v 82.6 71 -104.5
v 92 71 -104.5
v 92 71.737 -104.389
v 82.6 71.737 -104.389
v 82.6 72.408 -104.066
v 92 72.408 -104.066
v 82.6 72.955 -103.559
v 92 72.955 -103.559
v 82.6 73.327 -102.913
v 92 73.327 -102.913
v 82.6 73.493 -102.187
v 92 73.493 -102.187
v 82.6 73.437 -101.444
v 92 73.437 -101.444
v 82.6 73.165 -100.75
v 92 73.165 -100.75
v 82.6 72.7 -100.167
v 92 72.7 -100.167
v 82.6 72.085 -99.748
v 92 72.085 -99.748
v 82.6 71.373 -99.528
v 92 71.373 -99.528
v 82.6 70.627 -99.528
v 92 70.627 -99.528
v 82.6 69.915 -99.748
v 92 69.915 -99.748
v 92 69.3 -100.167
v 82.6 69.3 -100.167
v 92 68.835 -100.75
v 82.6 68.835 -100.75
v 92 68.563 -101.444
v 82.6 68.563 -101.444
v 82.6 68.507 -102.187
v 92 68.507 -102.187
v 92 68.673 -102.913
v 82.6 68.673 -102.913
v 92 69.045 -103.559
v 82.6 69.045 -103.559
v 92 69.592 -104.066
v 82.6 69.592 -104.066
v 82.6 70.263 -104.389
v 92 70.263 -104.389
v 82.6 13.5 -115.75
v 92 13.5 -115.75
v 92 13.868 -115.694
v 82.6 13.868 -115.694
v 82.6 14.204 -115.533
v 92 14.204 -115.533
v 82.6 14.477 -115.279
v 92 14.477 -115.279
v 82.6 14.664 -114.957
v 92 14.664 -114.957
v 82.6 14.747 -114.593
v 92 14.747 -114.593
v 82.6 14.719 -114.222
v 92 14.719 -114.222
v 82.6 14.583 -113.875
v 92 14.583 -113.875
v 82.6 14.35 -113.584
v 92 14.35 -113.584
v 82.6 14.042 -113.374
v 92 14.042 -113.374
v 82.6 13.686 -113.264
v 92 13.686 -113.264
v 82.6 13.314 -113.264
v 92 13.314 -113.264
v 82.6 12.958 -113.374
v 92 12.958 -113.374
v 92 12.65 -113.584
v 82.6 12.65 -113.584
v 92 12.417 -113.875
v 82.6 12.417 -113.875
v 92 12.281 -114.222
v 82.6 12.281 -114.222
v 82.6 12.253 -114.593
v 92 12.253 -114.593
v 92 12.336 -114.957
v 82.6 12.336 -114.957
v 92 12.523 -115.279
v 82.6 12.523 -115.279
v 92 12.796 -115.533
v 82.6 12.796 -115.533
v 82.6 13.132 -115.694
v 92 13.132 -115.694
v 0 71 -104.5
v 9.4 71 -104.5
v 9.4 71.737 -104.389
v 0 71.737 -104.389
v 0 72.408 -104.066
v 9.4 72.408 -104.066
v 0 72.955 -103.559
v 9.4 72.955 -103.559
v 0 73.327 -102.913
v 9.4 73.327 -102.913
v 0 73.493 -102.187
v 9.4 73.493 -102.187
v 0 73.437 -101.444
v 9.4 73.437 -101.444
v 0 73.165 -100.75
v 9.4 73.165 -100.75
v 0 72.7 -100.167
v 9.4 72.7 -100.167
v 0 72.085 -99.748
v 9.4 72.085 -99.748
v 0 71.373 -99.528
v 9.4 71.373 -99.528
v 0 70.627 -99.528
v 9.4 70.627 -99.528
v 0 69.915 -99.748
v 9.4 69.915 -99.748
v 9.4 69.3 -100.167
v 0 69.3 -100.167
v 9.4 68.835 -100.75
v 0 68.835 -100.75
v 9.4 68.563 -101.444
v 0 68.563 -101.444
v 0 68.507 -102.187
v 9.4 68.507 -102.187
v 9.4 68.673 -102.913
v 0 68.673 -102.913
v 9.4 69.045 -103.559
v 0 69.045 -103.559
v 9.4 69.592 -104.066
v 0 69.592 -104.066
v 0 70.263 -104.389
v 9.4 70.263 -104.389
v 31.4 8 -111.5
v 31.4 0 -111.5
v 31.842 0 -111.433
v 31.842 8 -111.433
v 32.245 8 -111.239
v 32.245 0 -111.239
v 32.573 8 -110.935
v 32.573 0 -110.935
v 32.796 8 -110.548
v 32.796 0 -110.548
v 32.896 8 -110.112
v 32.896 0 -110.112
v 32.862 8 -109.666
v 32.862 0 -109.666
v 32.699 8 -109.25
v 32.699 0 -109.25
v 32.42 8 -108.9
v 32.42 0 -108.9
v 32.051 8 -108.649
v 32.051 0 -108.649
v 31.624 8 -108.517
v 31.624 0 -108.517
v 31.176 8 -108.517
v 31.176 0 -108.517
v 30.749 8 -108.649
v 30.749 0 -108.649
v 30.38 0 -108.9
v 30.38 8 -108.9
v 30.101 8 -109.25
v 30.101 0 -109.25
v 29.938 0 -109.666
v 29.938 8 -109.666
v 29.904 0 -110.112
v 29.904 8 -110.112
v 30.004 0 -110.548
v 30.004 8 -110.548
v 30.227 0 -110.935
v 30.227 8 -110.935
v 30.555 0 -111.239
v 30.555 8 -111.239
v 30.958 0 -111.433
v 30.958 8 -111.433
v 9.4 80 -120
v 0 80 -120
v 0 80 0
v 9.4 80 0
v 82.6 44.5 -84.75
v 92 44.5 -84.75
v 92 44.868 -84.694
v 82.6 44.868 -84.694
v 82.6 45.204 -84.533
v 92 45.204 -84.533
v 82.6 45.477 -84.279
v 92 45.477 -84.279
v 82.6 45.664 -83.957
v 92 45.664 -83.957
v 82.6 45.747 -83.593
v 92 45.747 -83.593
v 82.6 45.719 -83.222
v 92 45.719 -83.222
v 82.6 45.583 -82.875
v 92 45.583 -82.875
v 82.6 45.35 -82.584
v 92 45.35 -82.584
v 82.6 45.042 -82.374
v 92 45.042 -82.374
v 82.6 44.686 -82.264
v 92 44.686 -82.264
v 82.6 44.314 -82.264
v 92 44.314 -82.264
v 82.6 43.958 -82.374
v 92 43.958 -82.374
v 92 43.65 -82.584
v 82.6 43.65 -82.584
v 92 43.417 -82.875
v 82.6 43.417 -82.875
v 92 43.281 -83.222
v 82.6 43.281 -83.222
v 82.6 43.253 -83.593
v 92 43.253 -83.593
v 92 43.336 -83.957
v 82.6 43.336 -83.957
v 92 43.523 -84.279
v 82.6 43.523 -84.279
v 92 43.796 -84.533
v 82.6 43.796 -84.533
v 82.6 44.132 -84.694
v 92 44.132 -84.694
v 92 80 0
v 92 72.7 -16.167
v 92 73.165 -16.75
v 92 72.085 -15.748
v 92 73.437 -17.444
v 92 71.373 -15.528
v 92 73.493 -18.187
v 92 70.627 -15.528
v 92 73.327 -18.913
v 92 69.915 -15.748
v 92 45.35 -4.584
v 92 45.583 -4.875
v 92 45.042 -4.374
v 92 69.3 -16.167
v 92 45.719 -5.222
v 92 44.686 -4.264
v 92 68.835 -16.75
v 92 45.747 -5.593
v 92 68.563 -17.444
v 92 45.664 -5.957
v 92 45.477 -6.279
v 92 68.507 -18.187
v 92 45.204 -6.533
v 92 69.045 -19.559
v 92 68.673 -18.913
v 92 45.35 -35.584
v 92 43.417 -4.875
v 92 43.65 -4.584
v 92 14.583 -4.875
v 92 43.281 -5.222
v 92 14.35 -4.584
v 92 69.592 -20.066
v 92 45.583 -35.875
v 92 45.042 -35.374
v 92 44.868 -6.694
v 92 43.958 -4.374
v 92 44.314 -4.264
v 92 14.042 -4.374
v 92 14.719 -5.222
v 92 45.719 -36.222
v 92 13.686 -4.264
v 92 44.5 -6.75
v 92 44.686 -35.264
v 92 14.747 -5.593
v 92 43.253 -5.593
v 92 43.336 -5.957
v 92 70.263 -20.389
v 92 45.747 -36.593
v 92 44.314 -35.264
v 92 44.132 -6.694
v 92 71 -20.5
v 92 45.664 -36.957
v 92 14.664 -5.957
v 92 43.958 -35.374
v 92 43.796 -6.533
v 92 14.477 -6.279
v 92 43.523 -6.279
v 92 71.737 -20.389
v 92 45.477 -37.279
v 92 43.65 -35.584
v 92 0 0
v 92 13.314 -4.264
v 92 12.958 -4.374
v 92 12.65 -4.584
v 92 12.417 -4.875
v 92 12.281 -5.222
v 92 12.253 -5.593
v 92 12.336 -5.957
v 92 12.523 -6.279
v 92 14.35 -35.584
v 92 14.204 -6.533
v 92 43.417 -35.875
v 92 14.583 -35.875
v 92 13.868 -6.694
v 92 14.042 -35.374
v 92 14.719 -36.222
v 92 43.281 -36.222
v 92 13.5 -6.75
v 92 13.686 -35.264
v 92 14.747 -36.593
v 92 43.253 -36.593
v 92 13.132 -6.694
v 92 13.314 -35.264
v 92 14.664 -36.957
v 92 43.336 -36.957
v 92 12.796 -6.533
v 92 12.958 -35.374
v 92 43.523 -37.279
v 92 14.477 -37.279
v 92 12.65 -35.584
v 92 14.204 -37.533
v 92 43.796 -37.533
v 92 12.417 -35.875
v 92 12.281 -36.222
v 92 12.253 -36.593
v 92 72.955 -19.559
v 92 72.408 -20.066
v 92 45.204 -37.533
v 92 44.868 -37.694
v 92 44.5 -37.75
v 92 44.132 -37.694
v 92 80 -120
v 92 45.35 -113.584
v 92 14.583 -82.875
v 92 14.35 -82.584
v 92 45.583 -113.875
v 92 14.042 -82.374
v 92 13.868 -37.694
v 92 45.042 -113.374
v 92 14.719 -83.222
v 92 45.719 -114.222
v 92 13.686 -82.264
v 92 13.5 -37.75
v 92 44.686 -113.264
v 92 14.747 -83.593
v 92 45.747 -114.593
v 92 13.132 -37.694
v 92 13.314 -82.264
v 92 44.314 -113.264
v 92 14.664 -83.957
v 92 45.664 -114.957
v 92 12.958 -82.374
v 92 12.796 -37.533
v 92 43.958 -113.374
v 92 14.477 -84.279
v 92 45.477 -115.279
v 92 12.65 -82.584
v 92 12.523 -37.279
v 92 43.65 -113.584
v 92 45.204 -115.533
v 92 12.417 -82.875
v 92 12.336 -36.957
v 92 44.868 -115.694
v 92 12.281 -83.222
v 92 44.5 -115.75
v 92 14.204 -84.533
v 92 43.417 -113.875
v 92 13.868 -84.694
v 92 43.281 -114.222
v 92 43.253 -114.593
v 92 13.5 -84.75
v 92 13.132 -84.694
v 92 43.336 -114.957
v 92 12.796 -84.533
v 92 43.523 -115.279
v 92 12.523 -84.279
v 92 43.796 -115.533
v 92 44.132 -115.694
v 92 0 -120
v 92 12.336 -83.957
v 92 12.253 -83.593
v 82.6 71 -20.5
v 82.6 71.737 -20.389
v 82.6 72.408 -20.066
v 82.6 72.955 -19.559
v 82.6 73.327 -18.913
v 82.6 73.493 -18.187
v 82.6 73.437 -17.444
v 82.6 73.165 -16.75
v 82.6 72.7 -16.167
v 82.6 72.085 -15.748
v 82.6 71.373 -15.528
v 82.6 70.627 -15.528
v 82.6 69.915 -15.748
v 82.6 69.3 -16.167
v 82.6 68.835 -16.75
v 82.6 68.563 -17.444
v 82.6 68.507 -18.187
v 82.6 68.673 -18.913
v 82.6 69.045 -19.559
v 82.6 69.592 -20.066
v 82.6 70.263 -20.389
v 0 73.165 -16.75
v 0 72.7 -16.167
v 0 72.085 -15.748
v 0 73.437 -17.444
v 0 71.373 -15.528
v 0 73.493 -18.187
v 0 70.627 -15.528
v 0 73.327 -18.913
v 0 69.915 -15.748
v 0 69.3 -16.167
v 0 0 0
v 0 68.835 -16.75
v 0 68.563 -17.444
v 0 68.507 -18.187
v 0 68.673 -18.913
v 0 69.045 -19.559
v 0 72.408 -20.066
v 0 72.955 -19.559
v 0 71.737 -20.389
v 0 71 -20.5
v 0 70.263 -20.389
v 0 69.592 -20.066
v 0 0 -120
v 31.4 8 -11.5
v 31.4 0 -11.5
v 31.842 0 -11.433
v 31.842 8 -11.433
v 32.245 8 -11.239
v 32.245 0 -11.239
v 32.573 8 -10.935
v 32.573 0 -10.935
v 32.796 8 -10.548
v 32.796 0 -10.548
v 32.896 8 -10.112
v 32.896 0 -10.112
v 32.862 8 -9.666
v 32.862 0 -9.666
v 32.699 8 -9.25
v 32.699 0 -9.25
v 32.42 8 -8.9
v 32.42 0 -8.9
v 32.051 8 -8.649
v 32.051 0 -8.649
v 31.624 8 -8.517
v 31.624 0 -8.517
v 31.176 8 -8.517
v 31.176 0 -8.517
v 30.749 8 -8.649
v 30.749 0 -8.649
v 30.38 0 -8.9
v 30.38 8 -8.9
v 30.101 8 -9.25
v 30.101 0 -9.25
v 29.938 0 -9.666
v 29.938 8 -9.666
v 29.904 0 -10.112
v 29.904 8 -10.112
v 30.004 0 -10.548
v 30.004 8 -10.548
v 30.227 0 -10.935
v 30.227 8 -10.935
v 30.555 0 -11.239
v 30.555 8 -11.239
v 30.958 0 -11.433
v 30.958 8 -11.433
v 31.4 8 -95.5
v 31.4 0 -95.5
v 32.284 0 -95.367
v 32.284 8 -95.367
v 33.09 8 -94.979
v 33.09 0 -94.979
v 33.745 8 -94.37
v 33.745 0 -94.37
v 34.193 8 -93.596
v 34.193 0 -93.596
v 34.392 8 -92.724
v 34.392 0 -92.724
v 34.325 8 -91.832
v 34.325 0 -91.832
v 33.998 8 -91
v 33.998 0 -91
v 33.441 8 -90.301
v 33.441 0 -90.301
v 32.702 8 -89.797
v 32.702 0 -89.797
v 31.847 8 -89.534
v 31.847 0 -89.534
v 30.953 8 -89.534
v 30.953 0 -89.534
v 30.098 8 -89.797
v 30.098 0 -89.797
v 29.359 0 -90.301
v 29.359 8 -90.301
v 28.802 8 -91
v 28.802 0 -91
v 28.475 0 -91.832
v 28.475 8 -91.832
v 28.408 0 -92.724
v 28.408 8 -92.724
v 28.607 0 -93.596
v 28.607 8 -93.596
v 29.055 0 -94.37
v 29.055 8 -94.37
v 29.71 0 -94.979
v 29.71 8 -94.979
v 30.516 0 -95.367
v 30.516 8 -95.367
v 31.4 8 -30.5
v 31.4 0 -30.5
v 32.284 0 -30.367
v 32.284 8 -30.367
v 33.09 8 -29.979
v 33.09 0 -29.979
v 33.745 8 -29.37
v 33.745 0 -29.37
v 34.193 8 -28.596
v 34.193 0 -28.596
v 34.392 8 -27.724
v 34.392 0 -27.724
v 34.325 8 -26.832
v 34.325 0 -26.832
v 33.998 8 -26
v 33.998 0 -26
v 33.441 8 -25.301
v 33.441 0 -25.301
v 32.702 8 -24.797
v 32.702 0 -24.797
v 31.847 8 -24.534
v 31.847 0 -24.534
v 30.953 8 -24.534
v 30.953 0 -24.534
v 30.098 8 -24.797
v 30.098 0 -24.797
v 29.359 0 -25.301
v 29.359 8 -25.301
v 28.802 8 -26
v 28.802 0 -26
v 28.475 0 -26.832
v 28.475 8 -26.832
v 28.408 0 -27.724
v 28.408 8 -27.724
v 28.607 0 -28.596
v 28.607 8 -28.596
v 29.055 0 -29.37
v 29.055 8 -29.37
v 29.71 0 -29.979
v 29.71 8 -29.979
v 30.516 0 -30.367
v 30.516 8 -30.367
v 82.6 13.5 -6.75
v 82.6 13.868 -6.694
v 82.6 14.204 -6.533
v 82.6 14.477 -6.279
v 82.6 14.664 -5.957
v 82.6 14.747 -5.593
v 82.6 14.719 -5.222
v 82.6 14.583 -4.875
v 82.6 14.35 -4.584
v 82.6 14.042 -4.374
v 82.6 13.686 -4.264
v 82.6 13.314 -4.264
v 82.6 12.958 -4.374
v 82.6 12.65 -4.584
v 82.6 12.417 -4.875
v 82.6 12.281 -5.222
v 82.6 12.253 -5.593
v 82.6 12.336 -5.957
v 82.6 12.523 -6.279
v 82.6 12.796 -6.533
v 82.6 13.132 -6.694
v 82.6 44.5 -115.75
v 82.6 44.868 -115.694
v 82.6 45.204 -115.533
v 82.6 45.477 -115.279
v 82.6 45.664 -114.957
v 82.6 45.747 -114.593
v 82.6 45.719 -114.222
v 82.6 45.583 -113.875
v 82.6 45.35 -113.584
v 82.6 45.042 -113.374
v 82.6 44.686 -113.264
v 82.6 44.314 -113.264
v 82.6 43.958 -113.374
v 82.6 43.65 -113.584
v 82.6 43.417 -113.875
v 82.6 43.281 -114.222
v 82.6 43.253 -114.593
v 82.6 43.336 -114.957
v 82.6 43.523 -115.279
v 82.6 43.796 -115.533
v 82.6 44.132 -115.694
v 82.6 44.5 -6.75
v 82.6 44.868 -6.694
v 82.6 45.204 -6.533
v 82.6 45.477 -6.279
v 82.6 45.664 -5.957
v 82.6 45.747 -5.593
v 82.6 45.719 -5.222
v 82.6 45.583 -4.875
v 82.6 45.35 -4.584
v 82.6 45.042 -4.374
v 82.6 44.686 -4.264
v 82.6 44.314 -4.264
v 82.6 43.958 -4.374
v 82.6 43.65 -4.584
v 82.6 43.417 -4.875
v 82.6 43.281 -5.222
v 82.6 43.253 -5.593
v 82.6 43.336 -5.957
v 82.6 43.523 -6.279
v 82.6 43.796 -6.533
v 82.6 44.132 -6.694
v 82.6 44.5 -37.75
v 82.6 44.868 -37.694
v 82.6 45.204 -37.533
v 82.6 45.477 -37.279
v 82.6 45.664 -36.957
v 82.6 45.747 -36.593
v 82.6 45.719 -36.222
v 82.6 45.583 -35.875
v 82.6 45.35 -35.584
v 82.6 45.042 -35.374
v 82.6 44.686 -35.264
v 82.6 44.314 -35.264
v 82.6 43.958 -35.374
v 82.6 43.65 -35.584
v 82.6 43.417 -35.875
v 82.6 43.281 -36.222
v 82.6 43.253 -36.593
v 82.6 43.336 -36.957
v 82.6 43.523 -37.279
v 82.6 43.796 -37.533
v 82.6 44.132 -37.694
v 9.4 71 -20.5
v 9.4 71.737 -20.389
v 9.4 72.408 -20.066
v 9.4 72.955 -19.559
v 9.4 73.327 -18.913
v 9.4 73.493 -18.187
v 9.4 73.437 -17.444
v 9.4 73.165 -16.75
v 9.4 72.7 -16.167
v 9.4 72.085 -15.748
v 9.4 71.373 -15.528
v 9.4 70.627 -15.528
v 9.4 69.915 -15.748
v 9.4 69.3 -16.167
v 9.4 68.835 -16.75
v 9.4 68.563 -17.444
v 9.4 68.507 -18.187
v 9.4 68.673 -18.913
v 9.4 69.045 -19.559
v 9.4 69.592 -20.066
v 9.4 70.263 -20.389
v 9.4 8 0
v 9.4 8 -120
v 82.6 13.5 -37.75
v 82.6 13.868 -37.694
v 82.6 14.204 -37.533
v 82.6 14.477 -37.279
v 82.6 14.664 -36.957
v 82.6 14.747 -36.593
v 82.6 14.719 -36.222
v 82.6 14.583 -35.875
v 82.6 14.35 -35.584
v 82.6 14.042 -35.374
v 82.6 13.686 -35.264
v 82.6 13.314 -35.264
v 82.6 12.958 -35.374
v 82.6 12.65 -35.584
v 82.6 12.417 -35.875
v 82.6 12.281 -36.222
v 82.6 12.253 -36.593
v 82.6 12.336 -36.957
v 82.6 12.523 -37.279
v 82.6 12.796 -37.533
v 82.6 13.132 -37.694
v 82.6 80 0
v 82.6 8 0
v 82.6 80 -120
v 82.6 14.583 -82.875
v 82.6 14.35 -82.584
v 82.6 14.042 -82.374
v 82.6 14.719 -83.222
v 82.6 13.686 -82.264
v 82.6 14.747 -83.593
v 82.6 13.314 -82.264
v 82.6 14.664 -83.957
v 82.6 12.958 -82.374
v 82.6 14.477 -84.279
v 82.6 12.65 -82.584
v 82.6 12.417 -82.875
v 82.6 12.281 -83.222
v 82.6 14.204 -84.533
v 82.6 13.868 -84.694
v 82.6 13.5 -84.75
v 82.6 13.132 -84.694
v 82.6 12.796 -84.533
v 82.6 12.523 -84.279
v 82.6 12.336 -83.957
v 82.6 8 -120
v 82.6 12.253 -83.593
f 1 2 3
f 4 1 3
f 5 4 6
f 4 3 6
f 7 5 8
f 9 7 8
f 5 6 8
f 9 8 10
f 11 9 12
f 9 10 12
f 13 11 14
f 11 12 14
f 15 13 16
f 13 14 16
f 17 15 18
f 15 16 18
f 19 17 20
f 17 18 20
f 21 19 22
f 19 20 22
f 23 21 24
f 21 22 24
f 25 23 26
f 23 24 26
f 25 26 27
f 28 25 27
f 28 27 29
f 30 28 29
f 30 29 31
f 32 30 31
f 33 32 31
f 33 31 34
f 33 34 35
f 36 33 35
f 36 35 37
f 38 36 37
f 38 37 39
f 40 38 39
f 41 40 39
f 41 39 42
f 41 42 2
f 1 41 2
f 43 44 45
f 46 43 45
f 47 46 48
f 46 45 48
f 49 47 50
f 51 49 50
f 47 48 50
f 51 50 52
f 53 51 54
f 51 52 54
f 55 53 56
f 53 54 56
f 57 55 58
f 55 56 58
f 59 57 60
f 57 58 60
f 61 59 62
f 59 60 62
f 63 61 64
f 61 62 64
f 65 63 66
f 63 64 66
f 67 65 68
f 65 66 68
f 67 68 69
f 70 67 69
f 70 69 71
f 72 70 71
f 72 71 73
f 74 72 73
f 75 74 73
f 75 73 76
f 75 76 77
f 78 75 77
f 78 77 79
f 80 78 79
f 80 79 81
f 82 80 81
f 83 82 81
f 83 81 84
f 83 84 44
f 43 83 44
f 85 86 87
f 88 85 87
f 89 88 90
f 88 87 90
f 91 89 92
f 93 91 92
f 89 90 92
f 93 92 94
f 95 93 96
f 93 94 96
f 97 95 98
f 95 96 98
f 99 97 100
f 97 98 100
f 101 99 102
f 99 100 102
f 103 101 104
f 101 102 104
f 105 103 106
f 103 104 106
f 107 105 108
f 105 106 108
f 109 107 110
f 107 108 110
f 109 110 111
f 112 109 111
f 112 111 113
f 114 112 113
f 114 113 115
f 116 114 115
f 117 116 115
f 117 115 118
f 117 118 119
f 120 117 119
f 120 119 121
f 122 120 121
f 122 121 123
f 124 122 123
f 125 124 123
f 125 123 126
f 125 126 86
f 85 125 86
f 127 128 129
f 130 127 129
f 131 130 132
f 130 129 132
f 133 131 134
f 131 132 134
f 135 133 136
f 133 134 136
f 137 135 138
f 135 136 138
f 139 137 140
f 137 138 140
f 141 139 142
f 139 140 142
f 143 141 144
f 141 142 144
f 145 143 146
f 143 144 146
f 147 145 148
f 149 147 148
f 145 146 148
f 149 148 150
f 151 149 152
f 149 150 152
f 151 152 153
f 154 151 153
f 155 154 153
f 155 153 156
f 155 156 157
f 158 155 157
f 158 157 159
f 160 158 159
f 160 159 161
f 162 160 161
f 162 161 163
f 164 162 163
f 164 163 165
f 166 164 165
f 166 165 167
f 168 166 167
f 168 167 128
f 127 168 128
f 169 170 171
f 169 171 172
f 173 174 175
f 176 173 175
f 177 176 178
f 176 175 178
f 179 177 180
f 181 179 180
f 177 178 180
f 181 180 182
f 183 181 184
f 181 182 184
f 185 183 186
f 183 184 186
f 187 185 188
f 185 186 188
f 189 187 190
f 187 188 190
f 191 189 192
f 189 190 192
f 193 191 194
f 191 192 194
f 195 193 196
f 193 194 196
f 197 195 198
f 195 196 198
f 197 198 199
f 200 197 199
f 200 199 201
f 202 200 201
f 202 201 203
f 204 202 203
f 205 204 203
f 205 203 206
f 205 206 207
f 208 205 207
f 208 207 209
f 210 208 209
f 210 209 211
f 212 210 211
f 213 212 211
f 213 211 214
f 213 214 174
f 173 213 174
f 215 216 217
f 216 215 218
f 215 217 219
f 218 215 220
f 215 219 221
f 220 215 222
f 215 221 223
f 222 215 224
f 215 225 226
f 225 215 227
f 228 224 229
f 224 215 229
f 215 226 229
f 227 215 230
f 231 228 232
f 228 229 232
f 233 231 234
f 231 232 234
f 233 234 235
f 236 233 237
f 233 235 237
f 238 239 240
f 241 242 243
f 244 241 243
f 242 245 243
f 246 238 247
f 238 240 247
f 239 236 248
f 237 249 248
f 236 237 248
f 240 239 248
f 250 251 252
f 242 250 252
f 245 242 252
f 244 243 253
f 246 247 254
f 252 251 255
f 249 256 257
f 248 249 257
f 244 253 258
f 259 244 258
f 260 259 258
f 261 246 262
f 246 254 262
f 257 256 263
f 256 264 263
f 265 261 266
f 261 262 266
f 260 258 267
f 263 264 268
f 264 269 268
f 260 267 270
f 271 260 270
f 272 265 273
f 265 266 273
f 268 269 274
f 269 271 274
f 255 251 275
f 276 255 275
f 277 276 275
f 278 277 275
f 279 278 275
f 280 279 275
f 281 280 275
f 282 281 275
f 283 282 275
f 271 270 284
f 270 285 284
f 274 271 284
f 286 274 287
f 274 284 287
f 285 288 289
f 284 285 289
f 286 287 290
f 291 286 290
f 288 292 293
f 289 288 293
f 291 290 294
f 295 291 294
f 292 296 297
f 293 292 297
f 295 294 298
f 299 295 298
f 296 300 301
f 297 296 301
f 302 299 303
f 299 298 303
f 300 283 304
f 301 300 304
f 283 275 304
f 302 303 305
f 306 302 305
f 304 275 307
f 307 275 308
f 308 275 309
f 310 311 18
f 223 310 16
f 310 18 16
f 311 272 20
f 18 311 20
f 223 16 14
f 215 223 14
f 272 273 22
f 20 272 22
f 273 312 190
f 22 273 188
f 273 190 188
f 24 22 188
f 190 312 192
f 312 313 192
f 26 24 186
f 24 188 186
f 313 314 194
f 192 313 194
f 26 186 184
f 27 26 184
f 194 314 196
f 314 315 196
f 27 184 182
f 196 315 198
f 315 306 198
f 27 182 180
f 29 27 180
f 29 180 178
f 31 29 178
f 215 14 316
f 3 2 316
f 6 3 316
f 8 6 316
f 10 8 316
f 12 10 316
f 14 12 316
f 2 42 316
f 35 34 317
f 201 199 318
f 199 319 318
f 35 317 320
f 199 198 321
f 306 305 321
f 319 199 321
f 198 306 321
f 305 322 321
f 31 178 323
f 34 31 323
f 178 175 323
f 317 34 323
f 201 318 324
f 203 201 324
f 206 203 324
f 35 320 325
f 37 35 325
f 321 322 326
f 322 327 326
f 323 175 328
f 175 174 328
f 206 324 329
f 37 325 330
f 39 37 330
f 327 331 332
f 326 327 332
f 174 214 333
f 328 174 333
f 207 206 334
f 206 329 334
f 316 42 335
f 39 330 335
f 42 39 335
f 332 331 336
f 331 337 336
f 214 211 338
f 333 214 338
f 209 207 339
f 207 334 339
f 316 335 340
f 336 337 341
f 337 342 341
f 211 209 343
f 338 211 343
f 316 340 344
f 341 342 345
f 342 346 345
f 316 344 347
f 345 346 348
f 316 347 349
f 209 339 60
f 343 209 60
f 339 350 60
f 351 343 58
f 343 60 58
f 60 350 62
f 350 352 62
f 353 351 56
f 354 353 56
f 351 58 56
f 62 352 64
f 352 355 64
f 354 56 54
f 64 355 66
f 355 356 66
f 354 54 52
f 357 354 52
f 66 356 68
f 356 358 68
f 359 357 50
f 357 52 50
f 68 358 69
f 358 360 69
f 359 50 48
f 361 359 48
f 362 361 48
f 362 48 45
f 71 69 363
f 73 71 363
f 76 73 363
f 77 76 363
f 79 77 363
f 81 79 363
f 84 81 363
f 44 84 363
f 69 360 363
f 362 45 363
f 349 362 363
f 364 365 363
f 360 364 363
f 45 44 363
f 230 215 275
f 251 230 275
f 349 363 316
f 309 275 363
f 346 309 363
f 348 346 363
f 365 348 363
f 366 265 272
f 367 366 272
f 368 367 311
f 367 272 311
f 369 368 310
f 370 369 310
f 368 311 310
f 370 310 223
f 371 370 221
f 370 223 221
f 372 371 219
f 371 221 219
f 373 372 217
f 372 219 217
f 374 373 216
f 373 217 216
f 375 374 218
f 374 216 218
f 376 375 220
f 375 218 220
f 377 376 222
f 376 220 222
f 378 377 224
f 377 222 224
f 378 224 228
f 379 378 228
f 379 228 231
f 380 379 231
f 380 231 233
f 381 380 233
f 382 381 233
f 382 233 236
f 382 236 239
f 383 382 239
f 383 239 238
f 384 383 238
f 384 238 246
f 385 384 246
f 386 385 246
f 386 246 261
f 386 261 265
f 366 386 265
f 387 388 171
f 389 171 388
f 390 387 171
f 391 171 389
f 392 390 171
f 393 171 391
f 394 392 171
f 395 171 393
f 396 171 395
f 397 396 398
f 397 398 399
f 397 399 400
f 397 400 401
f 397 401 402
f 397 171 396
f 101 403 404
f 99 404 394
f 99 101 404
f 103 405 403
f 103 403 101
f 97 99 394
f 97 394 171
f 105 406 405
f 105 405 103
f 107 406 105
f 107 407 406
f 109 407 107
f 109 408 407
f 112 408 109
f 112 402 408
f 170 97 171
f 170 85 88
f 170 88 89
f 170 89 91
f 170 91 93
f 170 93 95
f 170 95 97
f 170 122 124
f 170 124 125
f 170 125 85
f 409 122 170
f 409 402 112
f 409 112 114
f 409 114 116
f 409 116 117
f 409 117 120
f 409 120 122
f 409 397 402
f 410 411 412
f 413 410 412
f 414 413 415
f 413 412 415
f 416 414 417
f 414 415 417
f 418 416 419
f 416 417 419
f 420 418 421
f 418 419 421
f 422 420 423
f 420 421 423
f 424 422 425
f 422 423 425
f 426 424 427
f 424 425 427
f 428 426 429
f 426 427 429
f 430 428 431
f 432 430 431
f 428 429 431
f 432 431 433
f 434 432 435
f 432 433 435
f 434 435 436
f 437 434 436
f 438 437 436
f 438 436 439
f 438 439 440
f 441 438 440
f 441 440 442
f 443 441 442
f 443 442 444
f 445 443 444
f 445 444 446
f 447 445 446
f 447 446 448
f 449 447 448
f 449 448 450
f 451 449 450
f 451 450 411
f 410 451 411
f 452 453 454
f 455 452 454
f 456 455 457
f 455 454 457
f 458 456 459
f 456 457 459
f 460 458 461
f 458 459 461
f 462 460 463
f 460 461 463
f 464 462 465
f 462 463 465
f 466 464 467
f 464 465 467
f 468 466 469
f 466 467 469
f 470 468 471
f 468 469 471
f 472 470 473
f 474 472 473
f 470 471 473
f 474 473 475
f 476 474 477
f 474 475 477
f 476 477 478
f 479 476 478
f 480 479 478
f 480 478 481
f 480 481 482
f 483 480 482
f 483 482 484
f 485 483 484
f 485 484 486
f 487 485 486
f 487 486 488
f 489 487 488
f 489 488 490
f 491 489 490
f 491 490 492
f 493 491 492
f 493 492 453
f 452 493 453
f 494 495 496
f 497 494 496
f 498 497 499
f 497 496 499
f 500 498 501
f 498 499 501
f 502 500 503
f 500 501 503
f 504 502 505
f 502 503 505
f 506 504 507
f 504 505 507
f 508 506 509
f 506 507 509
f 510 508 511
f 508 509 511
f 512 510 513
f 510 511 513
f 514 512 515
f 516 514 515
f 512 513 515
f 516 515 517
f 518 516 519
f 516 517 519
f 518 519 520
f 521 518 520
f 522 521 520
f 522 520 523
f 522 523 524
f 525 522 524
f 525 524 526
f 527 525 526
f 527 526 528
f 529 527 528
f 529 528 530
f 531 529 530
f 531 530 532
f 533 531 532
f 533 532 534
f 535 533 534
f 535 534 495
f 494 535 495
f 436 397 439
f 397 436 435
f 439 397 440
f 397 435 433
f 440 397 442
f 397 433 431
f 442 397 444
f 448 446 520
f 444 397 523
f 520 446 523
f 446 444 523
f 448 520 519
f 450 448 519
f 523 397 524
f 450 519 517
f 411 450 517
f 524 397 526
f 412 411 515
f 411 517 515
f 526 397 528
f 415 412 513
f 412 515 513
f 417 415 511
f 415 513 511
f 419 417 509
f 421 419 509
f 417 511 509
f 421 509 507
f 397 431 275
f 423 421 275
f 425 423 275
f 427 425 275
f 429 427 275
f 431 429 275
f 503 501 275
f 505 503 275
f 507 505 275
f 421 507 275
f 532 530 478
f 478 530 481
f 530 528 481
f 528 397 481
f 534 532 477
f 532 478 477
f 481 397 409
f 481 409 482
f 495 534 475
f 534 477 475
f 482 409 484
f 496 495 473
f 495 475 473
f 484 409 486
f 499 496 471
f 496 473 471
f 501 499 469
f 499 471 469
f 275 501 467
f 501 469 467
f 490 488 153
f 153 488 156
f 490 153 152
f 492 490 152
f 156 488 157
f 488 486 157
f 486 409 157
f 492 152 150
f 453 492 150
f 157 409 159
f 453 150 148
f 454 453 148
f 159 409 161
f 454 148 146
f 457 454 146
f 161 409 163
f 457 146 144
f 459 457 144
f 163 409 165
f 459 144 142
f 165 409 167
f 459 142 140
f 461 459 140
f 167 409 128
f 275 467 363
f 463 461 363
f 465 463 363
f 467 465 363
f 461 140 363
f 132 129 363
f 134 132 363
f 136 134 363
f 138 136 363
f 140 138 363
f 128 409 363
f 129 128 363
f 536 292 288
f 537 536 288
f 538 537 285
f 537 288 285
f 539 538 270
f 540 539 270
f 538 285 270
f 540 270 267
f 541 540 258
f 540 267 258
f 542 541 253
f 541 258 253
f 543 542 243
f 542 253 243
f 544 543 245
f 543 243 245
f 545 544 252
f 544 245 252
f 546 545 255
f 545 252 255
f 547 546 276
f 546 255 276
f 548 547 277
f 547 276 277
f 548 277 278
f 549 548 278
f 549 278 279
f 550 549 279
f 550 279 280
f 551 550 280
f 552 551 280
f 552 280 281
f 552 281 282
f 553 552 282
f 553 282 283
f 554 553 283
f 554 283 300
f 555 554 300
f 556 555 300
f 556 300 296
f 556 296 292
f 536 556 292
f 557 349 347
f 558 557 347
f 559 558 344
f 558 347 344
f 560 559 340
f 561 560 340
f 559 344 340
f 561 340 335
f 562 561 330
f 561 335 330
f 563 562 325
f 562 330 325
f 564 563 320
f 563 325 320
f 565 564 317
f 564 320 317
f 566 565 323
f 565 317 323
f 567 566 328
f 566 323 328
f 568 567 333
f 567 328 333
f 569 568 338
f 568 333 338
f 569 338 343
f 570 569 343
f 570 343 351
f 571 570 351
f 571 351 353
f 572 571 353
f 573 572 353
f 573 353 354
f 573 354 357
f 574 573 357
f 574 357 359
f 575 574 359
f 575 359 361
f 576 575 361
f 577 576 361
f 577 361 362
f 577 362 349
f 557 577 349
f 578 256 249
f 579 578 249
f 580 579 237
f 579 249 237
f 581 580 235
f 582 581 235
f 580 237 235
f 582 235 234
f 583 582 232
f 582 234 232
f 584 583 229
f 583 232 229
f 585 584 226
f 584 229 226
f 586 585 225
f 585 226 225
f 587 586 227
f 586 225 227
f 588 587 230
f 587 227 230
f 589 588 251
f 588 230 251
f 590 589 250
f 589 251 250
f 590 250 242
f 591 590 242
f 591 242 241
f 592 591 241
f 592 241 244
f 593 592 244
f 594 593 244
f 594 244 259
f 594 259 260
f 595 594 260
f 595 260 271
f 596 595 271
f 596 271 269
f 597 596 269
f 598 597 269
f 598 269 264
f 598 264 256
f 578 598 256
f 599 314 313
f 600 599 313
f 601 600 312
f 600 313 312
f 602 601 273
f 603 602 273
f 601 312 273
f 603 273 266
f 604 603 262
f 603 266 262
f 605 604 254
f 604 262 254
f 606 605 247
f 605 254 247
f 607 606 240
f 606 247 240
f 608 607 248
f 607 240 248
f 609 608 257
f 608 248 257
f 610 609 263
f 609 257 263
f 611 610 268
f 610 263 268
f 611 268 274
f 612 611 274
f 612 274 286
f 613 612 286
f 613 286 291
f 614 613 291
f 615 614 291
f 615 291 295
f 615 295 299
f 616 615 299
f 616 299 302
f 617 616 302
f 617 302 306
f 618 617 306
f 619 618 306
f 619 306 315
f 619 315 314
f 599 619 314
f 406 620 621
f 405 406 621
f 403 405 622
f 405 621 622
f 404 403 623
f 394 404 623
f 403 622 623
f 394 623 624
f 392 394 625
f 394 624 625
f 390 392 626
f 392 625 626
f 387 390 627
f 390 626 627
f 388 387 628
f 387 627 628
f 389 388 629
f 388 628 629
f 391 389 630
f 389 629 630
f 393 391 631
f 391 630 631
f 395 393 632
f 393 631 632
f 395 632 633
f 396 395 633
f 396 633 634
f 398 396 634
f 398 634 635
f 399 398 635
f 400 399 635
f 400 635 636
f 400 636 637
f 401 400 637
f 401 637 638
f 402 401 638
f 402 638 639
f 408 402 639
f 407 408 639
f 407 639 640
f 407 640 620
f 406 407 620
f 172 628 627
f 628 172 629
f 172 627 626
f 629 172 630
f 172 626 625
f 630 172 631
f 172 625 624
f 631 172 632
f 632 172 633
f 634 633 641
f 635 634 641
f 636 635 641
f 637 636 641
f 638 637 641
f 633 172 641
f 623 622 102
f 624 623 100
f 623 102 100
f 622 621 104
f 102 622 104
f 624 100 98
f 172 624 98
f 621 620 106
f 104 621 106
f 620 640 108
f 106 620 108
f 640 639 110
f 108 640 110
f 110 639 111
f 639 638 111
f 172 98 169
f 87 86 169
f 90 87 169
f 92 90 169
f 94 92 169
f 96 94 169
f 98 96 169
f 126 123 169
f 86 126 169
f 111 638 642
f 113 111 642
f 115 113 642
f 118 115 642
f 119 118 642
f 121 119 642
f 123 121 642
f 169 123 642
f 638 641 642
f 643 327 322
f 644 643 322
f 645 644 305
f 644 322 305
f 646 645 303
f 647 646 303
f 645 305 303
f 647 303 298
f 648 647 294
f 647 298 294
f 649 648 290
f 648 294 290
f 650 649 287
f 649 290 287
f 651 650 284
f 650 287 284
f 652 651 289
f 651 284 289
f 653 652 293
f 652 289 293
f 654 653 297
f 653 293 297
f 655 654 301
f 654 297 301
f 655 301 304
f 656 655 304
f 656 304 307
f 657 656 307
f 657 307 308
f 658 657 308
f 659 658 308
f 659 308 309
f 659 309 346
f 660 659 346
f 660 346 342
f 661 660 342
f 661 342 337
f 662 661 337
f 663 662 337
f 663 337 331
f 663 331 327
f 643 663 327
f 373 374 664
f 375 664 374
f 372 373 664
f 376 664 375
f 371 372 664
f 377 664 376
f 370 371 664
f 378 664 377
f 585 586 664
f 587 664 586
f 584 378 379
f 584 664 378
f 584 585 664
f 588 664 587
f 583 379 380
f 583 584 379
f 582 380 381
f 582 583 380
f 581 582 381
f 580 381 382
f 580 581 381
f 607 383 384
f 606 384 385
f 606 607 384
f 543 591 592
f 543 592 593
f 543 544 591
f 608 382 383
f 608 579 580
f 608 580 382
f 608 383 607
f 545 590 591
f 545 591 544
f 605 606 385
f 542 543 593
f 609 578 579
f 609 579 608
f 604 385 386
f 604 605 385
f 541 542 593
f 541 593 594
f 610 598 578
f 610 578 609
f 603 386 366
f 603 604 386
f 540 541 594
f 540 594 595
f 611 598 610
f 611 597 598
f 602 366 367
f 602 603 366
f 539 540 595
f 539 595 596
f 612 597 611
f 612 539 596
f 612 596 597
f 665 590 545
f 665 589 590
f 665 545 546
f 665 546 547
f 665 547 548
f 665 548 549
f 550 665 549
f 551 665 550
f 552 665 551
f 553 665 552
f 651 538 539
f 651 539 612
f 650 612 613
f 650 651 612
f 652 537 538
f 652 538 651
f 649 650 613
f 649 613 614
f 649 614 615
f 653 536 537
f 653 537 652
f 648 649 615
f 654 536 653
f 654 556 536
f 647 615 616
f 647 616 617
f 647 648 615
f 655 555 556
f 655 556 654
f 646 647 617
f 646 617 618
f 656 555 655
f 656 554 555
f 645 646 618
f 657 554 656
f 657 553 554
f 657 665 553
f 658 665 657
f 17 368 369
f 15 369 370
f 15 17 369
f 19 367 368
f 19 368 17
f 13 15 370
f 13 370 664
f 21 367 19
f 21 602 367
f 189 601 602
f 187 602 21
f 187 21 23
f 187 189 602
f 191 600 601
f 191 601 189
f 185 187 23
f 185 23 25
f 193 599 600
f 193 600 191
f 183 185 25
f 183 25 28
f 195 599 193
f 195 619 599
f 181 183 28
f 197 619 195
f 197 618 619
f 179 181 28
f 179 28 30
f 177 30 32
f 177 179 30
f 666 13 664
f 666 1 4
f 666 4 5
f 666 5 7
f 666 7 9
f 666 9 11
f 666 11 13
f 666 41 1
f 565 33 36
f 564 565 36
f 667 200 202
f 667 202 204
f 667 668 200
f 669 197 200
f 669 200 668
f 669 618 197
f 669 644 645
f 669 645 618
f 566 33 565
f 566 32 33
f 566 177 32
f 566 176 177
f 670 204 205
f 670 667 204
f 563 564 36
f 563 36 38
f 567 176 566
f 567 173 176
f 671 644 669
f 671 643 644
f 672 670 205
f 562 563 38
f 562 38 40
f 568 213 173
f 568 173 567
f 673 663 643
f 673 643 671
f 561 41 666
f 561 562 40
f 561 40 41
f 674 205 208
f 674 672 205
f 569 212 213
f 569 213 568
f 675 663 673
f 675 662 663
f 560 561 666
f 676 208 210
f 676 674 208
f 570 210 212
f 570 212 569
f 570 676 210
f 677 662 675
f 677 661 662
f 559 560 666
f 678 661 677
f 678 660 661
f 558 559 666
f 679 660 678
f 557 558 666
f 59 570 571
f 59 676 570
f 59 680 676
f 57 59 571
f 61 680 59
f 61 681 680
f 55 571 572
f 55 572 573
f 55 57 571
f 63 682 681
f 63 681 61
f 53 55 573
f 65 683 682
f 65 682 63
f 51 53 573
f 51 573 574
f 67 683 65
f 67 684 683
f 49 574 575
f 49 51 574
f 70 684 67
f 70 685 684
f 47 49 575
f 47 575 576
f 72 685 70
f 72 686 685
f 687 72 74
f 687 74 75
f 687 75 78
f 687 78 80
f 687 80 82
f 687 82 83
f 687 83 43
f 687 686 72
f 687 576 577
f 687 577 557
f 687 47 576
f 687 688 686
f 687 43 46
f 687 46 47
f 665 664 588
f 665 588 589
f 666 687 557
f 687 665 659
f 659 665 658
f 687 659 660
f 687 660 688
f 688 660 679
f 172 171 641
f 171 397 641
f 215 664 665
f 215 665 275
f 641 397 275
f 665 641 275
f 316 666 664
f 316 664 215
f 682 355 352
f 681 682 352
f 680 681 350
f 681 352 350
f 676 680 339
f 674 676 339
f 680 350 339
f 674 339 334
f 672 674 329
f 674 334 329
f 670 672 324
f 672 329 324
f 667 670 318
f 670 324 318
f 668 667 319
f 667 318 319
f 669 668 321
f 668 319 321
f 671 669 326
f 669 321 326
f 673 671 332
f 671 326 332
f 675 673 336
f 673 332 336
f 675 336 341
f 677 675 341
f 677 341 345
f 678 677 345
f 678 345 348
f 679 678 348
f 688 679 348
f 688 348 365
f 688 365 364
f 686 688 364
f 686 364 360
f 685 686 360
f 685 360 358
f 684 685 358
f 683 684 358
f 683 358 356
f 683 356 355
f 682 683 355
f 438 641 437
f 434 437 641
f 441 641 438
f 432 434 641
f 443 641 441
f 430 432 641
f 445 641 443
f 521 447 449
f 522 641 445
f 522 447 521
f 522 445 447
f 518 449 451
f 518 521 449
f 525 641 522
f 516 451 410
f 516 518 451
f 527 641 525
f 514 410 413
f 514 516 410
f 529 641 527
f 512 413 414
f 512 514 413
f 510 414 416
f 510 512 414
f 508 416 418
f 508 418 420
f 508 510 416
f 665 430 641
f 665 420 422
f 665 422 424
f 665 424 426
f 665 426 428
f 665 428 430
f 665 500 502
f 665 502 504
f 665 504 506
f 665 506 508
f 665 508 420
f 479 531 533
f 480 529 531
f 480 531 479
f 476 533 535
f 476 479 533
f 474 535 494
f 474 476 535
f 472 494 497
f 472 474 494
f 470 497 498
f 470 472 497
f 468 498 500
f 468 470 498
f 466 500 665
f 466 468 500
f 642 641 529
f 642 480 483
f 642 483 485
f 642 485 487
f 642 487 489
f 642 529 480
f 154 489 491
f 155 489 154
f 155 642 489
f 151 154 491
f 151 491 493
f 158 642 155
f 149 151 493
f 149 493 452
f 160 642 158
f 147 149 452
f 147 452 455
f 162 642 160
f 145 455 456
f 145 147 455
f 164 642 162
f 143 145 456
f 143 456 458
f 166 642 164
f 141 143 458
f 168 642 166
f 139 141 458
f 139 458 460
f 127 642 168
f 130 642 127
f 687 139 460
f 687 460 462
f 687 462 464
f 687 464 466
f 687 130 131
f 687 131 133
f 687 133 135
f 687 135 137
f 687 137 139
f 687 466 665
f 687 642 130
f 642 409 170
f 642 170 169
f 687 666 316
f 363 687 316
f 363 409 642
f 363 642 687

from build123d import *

# Parameters (mm, degrees)
SKETCH1_W           = 92
SKETCH1_H           = 120
BOSS_EXTRUDE1_DEPTH = 8
SKETCH2_W           = 9.4
SKETCH2_H           = 120
BOSS_EXTRUDE2_DEPTH = 72
CUT_EXTRUDE1_REACH  = 173.067
SKETCH3_R           = 3
SKETCH3_R_2         = 1.5
CUT_EXTRUDE2_REACH  = 173.067
SKETCH4_R           = 1.25
SKETCH5_R           = 2.5
CUT_EXTRUDE3_DEPTH  = 172.067238243


with BuildPart() as part:
    # Sketch1 → Boss-Extrude1 (new body)
    with BuildSketch(Plane(origin=(0, 0, 0), x_dir=(1, 0, 0), z_dir=(0, 1, 0))):
        with Locations((46, 60)):
            Rectangle(SKETCH1_W, SKETCH1_H)
    extrude(amount=BOSS_EXTRUDE1_DEPTH)

    # Sketch2 → Boss-Extrude2 (add)
    with BuildSketch(Plane(origin=(0, 8, 0), x_dir=(1, 0, 0), z_dir=(0, 1, 0))):
        with Locations((4.7, 60)):
            Rectangle(SKETCH2_W, SKETCH2_H)
        with Locations((87.3, 60)):
            Rectangle(SKETCH2_W, SKETCH2_H)
    extrude(amount=BOSS_EXTRUDE2_DEPTH)

    # Sketch3 → Cut-Extrude1 (cut, up to next)
    with BuildSketch(Plane.XZ, mode=Mode.PRIVATE) as cut_extrude1_sk1:
        with Locations(Location((31.4, -92.5, 0), (0, 0, 270))):
            Circle(SKETCH3_R)
    cut_extrude1_tool1 = extrude(cut_extrude1_sk1.sketch, amount=-CUT_EXTRUDE1_REACH, mode=Mode.PRIVATE) & part.part
    # Sketch3 → Cut-Extrude1 (cut, up to next)
    with BuildSketch(Plane.XZ, mode=Mode.PRIVATE) as cut_extrude1_sk2:
        with Locations(Location((31.4, -110, 0), (0, 0, 270))):
            Circle(SKETCH3_R_2)
    cut_extrude1_tool2 = extrude(cut_extrude1_sk2.sketch, amount=-CUT_EXTRUDE1_REACH, mode=Mode.PRIVATE) & part.part
    # Sketch3 → Cut-Extrude1 (cut, up to next)
    with BuildSketch(Plane.XZ, mode=Mode.PRIVATE) as cut_extrude1_sk3:
        with Locations(Location((31.4, -10, 0), (0, 0, 270))):
            Circle(SKETCH3_R_2)
    cut_extrude1_tool3 = extrude(cut_extrude1_sk3.sketch, amount=-CUT_EXTRUDE1_REACH, mode=Mode.PRIVATE) & part.part
    # Sketch3 → Cut-Extrude1 (cut, up to next)
    with BuildSketch(Plane.XZ, mode=Mode.PRIVATE) as cut_extrude1_sk4:
        with Locations(Location((31.4, -27.5, 0), (0, 0, 270))):
            Circle(SKETCH3_R)
    cut_extrude1_tool4 = extrude(cut_extrude1_sk4.sketch, amount=-CUT_EXTRUDE1_REACH, mode=Mode.PRIVATE) & part.part
    add(cut_extrude1_tool1.solids().sort_by_distance((31.4, 0, -92.5))[0], mode=Mode.SUBTRACT)
    add(cut_extrude1_tool2.solids().sort_by_distance((31.4, 0, -110))[0], mode=Mode.SUBTRACT)
    add(cut_extrude1_tool3.solids().sort_by_distance((31.4, 0, -10))[0], mode=Mode.SUBTRACT)
    add(cut_extrude1_tool4.solids().sort_by_distance((31.4, 0, -27.5))[0], mode=Mode.SUBTRACT)

    # Sketch4 → Cut-Extrude2 (cut, up to next)
    with BuildSketch(Plane(origin=(92, 0, 0), x_dir=(0, 0, -1), z_dir=(1, 0, 0)), mode=Mode.PRIVATE) as cut_extrude2_sk1:
        with Locations((5.5, 44.5)):
            Circle(SKETCH4_R)
    cut_extrude2_tool1 = extrude(cut_extrude2_sk1.sketch, amount=-CUT_EXTRUDE2_REACH, mode=Mode.PRIVATE) & part.part
    # Sketch4 → Cut-Extrude2 (cut, up to next)
    with BuildSketch(Plane(origin=(92, 0, 0), x_dir=(0, 0, -1), z_dir=(1, 0, 0)), mode=Mode.PRIVATE) as cut_extrude2_sk2:
        with Locations((36.5, 44.5)):
            Circle(SKETCH4_R)
    cut_extrude2_tool2 = extrude(cut_extrude2_sk2.sketch, amount=-CUT_EXTRUDE2_REACH, mode=Mode.PRIVATE) & part.part
    # Sketch4 → Cut-Extrude2 (cut, up to next)
    with BuildSketch(Plane(origin=(92, 0, 0), x_dir=(0, 0, -1), z_dir=(1, 0, 0)), mode=Mode.PRIVATE) as cut_extrude2_sk3:
        with Locations((5.5, 13.5)):
            Circle(SKETCH4_R)
    cut_extrude2_tool3 = extrude(cut_extrude2_sk3.sketch, amount=-CUT_EXTRUDE2_REACH, mode=Mode.PRIVATE) & part.part
    # Sketch4 → Cut-Extrude2 (cut, up to next)
    with BuildSketch(Plane(origin=(92, 0, 0), x_dir=(0, 0, -1), z_dir=(1, 0, 0)), mode=Mode.PRIVATE) as cut_extrude2_sk4:
        with Locations((36.5, 13.5)):
            Circle(SKETCH4_R)
    cut_extrude2_tool4 = extrude(cut_extrude2_sk4.sketch, amount=-CUT_EXTRUDE2_REACH, mode=Mode.PRIVATE) & part.part
    # Sketch4 → Cut-Extrude2 (cut, up to next)
    with BuildSketch(Plane(origin=(92, 0, 0), x_dir=(0, 0, -1), z_dir=(1, 0, 0)), mode=Mode.PRIVATE) as cut_extrude2_sk5:
        with Locations((83.5, 13.5)):
            Circle(SKETCH4_R)
    cut_extrude2_tool5 = extrude(cut_extrude2_sk5.sketch, amount=-CUT_EXTRUDE2_REACH, mode=Mode.PRIVATE) & part.part
    # Sketch4 → Cut-Extrude2 (cut, up to next)
    with BuildSketch(Plane(origin=(92, 0, 0), x_dir=(0, 0, -1), z_dir=(1, 0, 0)), mode=Mode.PRIVATE) as cut_extrude2_sk6:
        with Locations((114.5, 13.5)):
            Circle(SKETCH4_R)
    cut_extrude2_tool6 = extrude(cut_extrude2_sk6.sketch, amount=-CUT_EXTRUDE2_REACH, mode=Mode.PRIVATE) & part.part
    # Sketch4 → Cut-Extrude2 (cut, up to next)
    with BuildSketch(Plane(origin=(92, 0, 0), x_dir=(0, 0, -1), z_dir=(1, 0, 0)), mode=Mode.PRIVATE) as cut_extrude2_sk7:
        with Locations((83.5, 44.5)):
            Circle(SKETCH4_R)
    cut_extrude2_tool7 = extrude(cut_extrude2_sk7.sketch, amount=-CUT_EXTRUDE2_REACH, mode=Mode.PRIVATE) & part.part
    # Sketch4 → Cut-Extrude2 (cut, up to next)
    with BuildSketch(Plane(origin=(92, 0, 0), x_dir=(0, 0, -1), z_dir=(1, 0, 0)), mode=Mode.PRIVATE) as cut_extrude2_sk8:
        with Locations((114.5, 44.5)):
            Circle(SKETCH4_R)
    cut_extrude2_tool8 = extrude(cut_extrude2_sk8.sketch, amount=-CUT_EXTRUDE2_REACH, mode=Mode.PRIVATE) & part.part
    add(cut_extrude2_tool1.solids().sort_by_distance((92, 44.5, -5.5))[0], mode=Mode.SUBTRACT)
    add(cut_extrude2_tool2.solids().sort_by_distance((92, 44.5, -36.5))[0], mode=Mode.SUBTRACT)
    add(cut_extrude2_tool3.solids().sort_by_distance((92, 13.5, -5.5))[0], mode=Mode.SUBTRACT)
    add(cut_extrude2_tool4.solids().sort_by_distance((92, 13.5, -36.5))[0], mode=Mode.SUBTRACT)
    add(cut_extrude2_tool5.solids().sort_by_distance((92, 13.5, -83.5))[0], mode=Mode.SUBTRACT)
    add(cut_extrude2_tool6.solids().sort_by_distance((92, 13.5, -114.5))[0], mode=Mode.SUBTRACT)
    add(cut_extrude2_tool7.solids().sort_by_distance((92, 44.5, -83.5))[0], mode=Mode.SUBTRACT)
    add(cut_extrude2_tool8.solids().sort_by_distance((92, 44.5, -114.5))[0], mode=Mode.SUBTRACT)

    # Sketch5 → Cut-Extrude3 (cut, through all)
    with BuildSketch(Plane(origin=(92, 0, 0), x_dir=(0, 0, -1), z_dir=(1, 0, 0))):
        with Locations((18, 71)):
            Circle(SKETCH5_R)
        with Locations((102, 71)):
            Circle(SKETCH5_R)
    extrude(amount=-CUT_EXTRUDE3_DEPTH, mode=Mode.SUBTRACT)


solid = part.part
